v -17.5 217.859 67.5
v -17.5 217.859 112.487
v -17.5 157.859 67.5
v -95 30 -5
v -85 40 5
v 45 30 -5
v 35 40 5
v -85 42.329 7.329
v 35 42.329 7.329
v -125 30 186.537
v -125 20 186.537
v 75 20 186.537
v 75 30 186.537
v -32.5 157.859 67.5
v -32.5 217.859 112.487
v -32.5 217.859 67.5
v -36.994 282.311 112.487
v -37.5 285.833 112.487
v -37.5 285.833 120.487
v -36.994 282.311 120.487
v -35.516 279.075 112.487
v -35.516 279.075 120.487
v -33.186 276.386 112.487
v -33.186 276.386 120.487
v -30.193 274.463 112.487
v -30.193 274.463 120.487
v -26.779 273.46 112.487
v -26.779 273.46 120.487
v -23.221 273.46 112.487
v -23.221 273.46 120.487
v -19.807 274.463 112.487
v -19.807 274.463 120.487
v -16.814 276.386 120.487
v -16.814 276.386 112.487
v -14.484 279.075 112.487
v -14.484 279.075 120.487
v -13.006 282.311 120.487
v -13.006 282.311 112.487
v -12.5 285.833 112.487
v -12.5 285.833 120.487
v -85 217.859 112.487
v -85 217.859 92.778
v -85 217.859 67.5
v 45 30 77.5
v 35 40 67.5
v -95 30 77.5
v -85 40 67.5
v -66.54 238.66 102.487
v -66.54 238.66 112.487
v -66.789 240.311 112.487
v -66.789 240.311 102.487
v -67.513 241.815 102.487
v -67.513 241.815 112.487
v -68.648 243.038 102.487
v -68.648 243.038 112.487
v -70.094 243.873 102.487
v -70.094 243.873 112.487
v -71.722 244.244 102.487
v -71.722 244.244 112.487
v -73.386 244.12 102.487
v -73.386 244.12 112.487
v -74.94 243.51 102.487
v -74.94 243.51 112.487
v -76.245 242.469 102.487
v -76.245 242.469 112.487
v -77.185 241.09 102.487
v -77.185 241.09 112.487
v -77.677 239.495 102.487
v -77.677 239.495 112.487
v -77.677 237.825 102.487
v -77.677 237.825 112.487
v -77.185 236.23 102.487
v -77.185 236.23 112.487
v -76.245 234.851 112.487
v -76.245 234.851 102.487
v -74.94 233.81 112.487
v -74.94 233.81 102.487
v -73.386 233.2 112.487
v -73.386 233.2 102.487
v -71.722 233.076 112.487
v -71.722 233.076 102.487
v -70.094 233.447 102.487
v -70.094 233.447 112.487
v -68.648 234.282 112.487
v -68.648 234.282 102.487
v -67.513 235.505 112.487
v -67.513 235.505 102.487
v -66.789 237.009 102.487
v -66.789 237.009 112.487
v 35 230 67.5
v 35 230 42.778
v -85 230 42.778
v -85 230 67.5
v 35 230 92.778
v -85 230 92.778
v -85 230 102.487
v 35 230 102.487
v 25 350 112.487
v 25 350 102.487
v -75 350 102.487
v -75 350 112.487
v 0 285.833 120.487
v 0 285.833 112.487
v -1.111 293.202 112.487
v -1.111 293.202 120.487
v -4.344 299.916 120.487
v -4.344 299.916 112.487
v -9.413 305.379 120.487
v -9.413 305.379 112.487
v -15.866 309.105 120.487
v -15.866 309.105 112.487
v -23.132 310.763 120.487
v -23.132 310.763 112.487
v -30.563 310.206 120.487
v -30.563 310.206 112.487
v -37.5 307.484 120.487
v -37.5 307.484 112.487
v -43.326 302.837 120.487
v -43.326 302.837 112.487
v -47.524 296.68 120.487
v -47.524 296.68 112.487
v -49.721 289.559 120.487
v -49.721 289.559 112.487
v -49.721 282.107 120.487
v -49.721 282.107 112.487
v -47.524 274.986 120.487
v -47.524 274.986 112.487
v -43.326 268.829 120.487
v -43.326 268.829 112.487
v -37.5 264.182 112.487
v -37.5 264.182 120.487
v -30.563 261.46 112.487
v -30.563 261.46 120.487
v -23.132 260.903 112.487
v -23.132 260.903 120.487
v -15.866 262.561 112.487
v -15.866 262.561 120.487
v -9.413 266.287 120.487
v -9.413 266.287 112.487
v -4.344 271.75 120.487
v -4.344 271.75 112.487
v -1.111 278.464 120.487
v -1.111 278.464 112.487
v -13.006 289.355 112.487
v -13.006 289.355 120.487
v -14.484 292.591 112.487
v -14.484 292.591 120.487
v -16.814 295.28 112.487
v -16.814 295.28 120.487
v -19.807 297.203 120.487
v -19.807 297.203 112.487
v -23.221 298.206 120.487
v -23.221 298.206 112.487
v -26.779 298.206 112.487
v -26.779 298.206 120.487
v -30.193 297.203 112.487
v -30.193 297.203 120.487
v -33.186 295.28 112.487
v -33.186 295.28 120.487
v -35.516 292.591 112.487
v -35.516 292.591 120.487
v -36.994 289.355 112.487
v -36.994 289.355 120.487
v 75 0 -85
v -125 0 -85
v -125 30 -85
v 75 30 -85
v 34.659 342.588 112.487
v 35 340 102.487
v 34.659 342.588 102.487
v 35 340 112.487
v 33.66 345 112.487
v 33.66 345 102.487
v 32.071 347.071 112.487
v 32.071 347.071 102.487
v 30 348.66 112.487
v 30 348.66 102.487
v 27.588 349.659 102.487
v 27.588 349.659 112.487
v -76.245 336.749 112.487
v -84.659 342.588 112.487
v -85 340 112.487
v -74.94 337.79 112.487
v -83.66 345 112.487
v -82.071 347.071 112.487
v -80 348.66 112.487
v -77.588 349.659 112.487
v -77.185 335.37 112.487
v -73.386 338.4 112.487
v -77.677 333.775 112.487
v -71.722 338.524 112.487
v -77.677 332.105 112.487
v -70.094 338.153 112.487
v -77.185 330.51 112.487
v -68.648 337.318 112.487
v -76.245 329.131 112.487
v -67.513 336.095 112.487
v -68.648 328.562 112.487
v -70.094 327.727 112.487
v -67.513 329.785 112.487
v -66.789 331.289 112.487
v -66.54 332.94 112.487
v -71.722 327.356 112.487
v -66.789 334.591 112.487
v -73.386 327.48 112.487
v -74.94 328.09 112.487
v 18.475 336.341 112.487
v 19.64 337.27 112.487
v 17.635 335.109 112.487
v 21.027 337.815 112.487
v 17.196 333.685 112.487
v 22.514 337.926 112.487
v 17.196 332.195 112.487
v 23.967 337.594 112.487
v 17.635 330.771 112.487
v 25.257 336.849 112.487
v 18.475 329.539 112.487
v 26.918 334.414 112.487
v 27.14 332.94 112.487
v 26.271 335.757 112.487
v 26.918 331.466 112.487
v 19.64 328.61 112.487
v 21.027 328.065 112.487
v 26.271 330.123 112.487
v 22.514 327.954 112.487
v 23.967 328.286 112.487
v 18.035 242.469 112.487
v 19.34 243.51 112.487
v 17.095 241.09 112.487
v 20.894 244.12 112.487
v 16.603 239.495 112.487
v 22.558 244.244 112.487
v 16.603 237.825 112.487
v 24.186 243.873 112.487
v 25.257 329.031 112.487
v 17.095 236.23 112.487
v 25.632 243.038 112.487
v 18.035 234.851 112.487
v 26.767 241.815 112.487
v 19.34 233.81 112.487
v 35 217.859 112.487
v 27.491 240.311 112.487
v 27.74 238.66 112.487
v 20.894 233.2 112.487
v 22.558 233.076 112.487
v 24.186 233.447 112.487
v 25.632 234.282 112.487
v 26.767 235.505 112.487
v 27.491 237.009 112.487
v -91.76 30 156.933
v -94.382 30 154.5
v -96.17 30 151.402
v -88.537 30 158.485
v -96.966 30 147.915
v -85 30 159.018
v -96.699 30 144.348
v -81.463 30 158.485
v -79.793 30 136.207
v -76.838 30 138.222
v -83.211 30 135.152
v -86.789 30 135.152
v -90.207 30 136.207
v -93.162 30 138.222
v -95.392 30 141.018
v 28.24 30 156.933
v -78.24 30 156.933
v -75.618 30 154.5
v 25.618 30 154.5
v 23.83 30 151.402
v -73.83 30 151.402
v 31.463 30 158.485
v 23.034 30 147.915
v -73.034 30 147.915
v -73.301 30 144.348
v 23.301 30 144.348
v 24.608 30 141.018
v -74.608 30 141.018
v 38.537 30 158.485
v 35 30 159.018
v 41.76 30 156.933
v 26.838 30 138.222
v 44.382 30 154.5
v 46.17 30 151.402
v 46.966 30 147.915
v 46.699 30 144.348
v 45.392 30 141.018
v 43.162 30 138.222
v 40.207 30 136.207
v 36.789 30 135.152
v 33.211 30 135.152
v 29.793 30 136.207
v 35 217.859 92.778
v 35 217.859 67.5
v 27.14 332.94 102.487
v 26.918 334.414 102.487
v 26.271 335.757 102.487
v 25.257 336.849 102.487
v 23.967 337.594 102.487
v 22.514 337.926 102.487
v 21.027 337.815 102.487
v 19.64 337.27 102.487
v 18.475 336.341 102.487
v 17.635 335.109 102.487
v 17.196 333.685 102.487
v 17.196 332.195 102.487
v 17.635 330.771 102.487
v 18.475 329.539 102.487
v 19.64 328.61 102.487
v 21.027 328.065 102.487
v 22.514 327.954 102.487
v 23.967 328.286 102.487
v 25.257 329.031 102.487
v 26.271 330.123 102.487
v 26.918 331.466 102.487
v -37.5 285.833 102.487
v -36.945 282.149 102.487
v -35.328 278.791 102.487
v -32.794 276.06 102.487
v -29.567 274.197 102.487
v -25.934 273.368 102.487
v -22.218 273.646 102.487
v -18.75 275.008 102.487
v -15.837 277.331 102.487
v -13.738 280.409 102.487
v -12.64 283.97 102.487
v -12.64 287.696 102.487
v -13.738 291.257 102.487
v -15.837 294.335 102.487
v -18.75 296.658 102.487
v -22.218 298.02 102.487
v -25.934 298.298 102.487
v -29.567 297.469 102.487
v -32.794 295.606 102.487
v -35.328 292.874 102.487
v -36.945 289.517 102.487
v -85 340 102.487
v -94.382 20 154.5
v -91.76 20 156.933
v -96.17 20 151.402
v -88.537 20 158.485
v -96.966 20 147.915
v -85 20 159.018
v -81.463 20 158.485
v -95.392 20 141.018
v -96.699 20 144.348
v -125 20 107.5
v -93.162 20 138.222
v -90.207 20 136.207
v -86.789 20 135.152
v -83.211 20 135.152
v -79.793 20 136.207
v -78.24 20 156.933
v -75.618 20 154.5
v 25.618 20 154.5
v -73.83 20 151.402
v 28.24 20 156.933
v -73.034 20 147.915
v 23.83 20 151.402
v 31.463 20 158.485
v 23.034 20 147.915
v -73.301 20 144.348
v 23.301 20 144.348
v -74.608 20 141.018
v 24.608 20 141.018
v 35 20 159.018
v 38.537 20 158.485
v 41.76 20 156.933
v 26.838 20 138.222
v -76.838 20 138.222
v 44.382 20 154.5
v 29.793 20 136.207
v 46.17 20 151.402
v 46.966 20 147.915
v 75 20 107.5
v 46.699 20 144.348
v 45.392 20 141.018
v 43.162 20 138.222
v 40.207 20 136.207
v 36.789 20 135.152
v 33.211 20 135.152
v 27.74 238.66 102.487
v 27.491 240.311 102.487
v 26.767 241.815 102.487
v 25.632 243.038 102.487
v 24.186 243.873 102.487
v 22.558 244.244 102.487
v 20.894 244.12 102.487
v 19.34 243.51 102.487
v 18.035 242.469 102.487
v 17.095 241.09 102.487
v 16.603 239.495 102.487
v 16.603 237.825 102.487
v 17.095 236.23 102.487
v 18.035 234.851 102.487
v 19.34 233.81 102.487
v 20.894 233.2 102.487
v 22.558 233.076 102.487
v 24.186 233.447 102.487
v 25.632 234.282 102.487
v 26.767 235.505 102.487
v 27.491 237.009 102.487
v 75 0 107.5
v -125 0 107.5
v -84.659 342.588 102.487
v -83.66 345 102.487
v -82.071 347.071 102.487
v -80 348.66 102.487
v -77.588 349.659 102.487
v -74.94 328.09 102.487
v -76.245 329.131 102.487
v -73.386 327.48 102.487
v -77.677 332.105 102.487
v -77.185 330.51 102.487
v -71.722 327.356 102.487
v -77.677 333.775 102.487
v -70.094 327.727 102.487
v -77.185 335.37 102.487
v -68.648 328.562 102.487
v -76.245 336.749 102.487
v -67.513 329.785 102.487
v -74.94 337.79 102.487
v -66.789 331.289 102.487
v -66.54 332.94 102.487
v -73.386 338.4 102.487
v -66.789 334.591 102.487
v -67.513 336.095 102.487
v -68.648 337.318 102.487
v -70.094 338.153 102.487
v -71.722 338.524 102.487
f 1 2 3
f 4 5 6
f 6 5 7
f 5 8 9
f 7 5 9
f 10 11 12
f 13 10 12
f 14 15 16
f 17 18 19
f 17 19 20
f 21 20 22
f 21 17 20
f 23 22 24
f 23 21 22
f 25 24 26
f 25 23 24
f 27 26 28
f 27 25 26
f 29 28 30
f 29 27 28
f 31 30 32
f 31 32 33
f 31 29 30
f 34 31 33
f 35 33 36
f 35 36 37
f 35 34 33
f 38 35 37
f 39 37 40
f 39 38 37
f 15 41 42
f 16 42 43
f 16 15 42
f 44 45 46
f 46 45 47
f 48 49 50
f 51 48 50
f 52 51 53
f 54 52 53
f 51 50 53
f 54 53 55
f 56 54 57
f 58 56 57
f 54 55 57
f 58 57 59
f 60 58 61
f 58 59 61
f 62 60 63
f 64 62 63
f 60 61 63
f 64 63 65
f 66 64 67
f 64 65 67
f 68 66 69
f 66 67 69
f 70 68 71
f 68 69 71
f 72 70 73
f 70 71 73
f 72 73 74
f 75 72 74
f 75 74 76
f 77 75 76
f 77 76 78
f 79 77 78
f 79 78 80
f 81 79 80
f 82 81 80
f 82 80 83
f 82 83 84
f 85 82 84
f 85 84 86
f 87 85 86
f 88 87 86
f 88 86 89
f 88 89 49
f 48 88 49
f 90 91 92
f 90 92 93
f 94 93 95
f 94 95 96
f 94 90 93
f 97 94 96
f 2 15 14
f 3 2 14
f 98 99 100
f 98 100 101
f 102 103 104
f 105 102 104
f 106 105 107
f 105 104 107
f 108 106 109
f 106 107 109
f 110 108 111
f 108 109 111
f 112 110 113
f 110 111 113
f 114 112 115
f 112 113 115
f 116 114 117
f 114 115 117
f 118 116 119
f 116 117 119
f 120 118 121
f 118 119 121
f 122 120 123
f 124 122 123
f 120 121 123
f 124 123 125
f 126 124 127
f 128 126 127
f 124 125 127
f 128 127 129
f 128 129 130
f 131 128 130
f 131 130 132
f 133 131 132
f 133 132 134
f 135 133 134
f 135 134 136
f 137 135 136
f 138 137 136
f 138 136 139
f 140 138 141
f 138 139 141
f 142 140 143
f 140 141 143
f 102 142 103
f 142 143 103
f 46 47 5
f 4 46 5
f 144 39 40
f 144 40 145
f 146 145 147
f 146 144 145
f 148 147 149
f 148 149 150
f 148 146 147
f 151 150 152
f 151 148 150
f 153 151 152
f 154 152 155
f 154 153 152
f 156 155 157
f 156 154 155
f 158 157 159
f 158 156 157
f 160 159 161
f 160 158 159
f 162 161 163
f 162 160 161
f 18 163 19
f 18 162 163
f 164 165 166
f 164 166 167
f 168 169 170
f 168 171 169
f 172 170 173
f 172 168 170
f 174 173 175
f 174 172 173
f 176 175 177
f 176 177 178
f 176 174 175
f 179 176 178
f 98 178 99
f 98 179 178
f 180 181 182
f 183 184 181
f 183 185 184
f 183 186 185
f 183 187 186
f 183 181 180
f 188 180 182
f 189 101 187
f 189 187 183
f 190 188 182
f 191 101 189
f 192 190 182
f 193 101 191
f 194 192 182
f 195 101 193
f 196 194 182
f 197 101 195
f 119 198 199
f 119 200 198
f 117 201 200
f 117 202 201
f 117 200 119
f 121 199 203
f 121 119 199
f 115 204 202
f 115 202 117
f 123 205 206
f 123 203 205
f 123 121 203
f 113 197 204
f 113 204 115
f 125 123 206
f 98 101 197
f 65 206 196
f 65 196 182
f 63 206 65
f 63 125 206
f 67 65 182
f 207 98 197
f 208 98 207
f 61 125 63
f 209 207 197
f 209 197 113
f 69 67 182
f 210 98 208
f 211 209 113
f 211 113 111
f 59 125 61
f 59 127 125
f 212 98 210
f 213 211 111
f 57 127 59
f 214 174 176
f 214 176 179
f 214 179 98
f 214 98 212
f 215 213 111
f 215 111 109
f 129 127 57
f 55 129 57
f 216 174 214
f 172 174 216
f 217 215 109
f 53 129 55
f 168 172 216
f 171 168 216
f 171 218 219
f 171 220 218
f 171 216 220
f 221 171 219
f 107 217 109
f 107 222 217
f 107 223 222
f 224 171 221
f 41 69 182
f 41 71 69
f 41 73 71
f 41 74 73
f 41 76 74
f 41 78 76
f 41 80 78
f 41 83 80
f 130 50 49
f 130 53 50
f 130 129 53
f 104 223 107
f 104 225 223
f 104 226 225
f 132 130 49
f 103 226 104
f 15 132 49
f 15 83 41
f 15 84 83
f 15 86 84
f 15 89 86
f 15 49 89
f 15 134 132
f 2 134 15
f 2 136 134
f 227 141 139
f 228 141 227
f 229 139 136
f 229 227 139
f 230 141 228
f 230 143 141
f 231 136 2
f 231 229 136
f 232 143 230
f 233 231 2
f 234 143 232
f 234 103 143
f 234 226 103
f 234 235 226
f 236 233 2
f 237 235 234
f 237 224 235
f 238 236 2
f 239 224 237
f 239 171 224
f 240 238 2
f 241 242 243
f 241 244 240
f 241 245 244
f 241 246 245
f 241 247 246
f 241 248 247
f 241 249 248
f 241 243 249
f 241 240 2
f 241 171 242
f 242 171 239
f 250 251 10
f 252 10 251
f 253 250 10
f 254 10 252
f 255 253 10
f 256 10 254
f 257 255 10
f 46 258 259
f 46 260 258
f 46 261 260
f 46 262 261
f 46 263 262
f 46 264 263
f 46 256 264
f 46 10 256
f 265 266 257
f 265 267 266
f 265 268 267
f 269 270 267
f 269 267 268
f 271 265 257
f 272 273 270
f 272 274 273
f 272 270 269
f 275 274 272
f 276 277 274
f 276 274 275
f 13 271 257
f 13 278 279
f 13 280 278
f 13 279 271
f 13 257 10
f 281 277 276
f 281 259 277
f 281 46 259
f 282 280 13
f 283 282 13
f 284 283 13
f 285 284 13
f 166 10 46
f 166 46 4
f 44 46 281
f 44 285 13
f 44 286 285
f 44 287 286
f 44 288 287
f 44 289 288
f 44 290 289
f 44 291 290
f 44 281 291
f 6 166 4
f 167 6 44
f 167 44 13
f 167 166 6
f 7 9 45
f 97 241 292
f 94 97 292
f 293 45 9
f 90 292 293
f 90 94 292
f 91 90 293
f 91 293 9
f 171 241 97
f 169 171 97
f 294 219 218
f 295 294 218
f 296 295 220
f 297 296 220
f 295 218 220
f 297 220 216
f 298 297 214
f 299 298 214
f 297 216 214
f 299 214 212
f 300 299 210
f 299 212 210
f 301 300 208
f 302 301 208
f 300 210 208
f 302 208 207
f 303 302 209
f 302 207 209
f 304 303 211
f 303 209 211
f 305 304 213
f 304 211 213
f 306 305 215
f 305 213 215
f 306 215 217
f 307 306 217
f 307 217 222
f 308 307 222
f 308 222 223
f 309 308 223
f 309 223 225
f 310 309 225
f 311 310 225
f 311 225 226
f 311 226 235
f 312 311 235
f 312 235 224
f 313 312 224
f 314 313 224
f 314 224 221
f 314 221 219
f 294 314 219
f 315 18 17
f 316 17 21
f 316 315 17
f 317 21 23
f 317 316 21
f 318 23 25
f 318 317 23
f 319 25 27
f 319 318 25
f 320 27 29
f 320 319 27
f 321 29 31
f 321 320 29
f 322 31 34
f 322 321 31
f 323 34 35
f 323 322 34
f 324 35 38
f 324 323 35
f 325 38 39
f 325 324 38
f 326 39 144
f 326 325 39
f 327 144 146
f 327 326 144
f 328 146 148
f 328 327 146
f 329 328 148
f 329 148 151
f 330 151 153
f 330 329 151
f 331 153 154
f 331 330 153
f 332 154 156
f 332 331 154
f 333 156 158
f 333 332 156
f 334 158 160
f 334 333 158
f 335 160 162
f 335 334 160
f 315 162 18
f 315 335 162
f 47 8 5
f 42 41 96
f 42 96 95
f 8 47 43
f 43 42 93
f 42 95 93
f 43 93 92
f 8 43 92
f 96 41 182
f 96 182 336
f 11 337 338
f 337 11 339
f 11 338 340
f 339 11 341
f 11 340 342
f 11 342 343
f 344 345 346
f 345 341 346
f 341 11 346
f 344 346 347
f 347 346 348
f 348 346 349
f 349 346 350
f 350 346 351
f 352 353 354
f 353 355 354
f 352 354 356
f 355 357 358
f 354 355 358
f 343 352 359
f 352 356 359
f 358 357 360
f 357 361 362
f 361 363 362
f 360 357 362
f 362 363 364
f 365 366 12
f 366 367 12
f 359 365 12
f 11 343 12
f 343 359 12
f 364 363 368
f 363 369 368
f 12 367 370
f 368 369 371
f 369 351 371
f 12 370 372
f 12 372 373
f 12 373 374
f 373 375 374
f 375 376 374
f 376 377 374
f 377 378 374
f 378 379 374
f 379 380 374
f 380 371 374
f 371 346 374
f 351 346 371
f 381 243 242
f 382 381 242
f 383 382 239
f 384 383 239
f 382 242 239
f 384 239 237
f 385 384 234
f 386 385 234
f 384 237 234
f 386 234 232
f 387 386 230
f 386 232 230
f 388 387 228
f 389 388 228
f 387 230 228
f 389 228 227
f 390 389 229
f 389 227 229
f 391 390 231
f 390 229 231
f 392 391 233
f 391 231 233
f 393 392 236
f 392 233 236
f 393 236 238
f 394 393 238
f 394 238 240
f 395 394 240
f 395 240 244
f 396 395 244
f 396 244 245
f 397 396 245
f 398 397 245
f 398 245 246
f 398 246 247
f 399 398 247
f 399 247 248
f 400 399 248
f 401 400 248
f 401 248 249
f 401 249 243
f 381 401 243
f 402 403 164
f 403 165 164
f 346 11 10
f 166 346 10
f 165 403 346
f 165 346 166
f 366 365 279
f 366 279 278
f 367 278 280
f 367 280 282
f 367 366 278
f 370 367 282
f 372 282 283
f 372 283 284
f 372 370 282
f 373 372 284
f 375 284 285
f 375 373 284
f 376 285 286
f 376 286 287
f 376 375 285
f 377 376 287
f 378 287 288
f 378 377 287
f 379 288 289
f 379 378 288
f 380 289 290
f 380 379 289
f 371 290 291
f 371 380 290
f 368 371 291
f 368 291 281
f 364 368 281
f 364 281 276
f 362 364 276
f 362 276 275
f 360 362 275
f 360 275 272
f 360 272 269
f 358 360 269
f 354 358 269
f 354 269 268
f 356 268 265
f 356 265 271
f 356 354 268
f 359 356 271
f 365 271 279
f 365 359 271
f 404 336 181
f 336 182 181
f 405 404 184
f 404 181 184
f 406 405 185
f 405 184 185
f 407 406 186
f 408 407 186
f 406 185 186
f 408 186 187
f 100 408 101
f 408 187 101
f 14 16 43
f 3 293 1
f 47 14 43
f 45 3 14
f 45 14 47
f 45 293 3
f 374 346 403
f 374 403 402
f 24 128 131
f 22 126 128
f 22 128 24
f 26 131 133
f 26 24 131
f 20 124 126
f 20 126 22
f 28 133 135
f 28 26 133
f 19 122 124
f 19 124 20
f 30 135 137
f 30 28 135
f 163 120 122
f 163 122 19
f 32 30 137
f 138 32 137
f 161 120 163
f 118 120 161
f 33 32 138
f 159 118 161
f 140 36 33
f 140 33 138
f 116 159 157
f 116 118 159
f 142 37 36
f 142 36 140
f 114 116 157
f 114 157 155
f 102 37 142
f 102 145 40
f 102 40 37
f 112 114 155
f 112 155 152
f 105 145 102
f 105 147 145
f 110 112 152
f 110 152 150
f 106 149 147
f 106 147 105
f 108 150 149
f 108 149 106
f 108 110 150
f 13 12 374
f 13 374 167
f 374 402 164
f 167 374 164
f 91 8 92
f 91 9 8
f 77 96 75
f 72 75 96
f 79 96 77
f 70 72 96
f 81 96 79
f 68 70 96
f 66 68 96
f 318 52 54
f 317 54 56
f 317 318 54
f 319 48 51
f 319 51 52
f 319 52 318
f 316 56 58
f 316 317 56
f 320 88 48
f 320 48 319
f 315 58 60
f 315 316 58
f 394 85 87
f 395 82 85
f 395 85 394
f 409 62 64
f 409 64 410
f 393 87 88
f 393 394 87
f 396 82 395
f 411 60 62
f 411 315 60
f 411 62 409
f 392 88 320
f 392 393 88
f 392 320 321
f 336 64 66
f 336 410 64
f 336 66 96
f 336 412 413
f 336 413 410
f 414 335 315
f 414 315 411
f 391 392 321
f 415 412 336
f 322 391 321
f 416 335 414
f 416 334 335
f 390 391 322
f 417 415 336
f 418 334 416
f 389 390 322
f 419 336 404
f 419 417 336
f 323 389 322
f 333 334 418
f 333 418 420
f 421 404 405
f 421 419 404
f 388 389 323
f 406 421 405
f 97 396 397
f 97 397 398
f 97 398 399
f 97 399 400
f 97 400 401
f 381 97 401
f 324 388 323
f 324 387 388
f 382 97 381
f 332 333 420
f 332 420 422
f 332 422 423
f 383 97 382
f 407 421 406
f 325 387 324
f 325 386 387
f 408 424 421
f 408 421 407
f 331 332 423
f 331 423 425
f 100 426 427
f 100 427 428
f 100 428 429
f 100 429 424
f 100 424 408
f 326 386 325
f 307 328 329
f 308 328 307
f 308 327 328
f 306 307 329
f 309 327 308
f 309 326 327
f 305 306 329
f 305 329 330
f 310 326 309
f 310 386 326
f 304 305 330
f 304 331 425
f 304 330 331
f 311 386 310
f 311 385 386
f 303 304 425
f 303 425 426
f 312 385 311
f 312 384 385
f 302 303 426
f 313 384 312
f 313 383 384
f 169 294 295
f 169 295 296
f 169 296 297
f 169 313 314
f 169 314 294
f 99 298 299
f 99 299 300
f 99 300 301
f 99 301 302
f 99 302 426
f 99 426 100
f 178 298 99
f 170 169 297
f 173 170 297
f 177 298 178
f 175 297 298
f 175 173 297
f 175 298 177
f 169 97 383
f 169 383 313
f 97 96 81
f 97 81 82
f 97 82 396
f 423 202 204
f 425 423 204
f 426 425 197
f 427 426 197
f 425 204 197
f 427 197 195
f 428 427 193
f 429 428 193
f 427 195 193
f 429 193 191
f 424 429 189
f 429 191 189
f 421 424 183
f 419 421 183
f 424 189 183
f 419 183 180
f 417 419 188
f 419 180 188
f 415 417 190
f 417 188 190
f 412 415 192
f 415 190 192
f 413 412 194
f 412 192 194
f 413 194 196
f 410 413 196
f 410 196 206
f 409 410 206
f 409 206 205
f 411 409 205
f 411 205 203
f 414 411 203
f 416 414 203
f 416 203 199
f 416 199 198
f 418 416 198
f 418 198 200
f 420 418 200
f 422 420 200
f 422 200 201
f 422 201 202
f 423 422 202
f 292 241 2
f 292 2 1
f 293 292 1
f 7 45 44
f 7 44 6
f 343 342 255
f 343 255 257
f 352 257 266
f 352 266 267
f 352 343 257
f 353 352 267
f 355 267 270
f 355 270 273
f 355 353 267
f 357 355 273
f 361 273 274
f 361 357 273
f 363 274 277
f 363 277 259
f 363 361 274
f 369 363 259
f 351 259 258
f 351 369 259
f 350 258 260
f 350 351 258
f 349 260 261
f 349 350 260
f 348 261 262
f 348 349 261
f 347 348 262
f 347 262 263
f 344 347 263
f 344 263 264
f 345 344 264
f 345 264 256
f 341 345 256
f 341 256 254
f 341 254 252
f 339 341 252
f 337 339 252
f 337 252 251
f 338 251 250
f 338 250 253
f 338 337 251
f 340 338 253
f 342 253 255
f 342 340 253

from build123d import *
from OCP.BRepFilletAPI import BRepFilletAPI_MakeChamfer
from build123d.topology import SkipClean

# Parameters (mm, degrees)
SKETCH_1_W               = 150
SKETCH_1_H               = 150
EXTRUDE_1_DEPTH          = 20
SKETCH_2_W               = 200
SKETCH_2_H               = 170
EXTRUDE_2_DEPTH          = 20
SKETCH_3_W               = 200
SKETCH_3_H               = 22.5
EXTRUDE_3_DEPTH          = 20
SKETCH_4_W               = 200
SKETCH_4_H               = 101.536616744
SKETCH_4_R               = 12
EXTRUDE_4_DEPTH          = 10
SKETCH_5_W               = 200
SKETCH_5_H               = 170
EXTRUDE_5_DEPTH          = 10
SKETCH_6_W               = 12.361111111
SKETCH_6_H               = 120
EXTRUDE_6_DEPTH          = 60
CHAMFER_1_SIZE           = 10
CHAMFER_1_SIZE2          = 12.546778674
SKETCH_8_R               = 12.5
CUT_EXTRUDE_1_DEPTH      = 200
SKETCH_9_R               = 5.6
CUT_EXTRUDE_2_DEPTH      = 200
FILLET_1_R               = 10
SKETCH_10_R              = 40
SKETCH_10_R_2            = 8.532995409
EXTRUDE_7_DEPTH          = 5
SKETCH_11_R              = 12.5
CUT_EXTRUDE_3_DEPTH      = 200
SKETCH_12_W              = 50
SKETCH_12_H              = 12.140710291
EXTRUDE_8_DEPTH          = 120
EXTRUDE_9_DEPTH          = 120
SKETCH_14_R              = 5
SKETCH_14_R_2            = 5.6
CUT_EXTRUDE_4_DEPTH      = 200
CUT_EXTRUDE_5_DEPTH      = 428.663313117
CUT_EXTRUDE_5_DEPTH_BACK = 428.663313117
SKETCH_16_W              = 64.88929467
SKETCH_16_H              = 154.650571828
SKETCH_17_R              = 25
SKETCH_17_R_2            = 12.5
EXTRUDE_11_DEPTH         = 8
FILLET_2_R               = 10
RIB_1_REACH              = 411.018
SKETCH_18_WALL_W         = 895.028437604
SKETCH_18_WALL_H         = 15
CUT_EXTRUDE_6_DEPTH      = 425.676064177
CUT_EXTRUDE_6_DEPTH_BACK = 425.676064177
SKETCH_19_R              = 12.5


with BuildPart() as part:
    # 草图1 → 凸台-拉伸1 (new body)
    with BuildSketch(Plane(origin=(0, 0, 0), x_dir=(1, 0, 0), z_dir=(0, 1, 0))):
        Rectangle(SKETCH_1_W, SKETCH_1_H)
    extrude(amount=EXTRUDE_1_DEPTH)

    # 草图2 → 凸台-拉伸2 (add)
    with BuildSketch(Plane(origin=(0, 20, 0), x_dir=(1, 0, 0), z_dir=(0, 1, 0))):
        with Locations((-25, 0)):
            Rectangle(SKETCH_2_W, SKETCH_2_H)
    extrude(amount=-EXTRUDE_2_DEPTH)

    # 草图3 → 凸台-拉伸3 (add)
    with BuildSketch(Plane(origin=(0, 20, 0), x_dir=(1, 0, 0), z_dir=(0, 1, 0))):
        with Locations((-25, -96.25)):
            Rectangle(SKETCH_3_W, SKETCH_3_H)
    extrude(amount=-EXTRUDE_3_DEPTH)

    # 草图4 → 凸台-拉伸4 (add)
    with BuildSketch(Plane(origin=(0, 20, 0), x_dir=(1, 0, 0), z_dir=(0, 1, 0))):
        with Locations((-25, -135.768308372)):
            Rectangle(SKETCH_4_W, SKETCH_4_H)
        with Locations(Location((35, -147.018308372, 0), (0, 0, 270))):
            Circle(SKETCH_4_R, mode=Mode.SUBTRACT)
        with Locations(Location((-85, -147.018308372, 0), (0, 0, 270))):
            Circle(SKETCH_4_R, mode=Mode.SUBTRACT)
    extrude(amount=EXTRUDE_4_DEPTH)

    # 草图5 → 凸台-拉伸5 (add)
    with BuildSketch(Plane(origin=(0, 20, 0), x_dir=(1, 0, 0), z_dir=(0, 1, 0))):
        with Locations((-25, 0)):
            Rectangle(SKETCH_5_W, SKETCH_5_H)
    extrude(amount=EXTRUDE_5_DEPTH)

    # 草图6 → 凸台-拉伸6 (add, symmetric)
    with BuildSketch(Plane(origin=(-25, 0, 0), x_dir=(0, 0, -1), z_dir=(1, 0, 0))):
        Polygon((-67.5, 30), (-5, 30), (-42.777777778, 230), (-67.5, 230), align=None)
        with Locations((-61.319444445, 290)):
            Rectangle(SKETCH_6_W, SKETCH_6_H)
    extrude(amount=EXTRUDE_6_DEPTH, both=True)

    # 倒角1: one chamfer whose edges measure the first distance from different faces: ONE call of the kernel's chamfer builder (chamfer() names one face for all edges)
    chamfer_1_edges_1 = [part.edges().sort_by_distance(p)[0] for p in [
        (-85, 30, 36.25),
        (-25, 30, 67.5),
        (35, 30, 36.25),
    ]]
    chamfer_1_edges_2 = [part.edges().sort_by_distance(p)[0] for p in [
        (-25, 30, 5),
    ]]
    chamfer_1_side_2 = [part.faces().sort_by_distance(p)[0] for p in [
        (-121.627580479, 30, 50.768308372),
    ]]
    chamfer_1 = BRepFilletAPI_MakeChamfer(part.part.solid().wrapped)
    for e in chamfer_1_edges_1:
        chamfer_1.Add(CHAMFER_1_SIZE, e.wrapped)
    for e in chamfer_1_edges_2:
        chamfer_1.Add(CHAMFER_1_SIZE, CHAMFER_1_SIZE2, e.wrapped, chamfer_1_side_2[0].wrapped)  # the first distance lies on this face
    add(Compound.cast(chamfer_1.Shape()), mode=Mode.REPLACE)

    # 草图8 → 切除-拉伸1 (cut)
    with BuildSketch(Plane.XY.offset(67.5)):
        with Locations((-25, 285.8)):
            Circle(SKETCH_8_R)
    extrude(amount=-CUT_EXTRUDE_1_DEPTH, mode=Mode.SUBTRACT)

    # 草图9 → 切除-拉伸2 (cut)
    with BuildSketch(Plane.XY.offset(67.5)):
        with Locations((-72.14, 333.54)):
            Circle(SKETCH_9_R)
        with Locations((-72.14, 239.26)):
            Circle(SKETCH_9_R)
        with Locations((22.14, 239.26)):
            Circle(SKETCH_9_R)
        with Locations((22.14, 333.54)):
            Circle(SKETCH_9_R)
    extrude(amount=-CUT_EXTRUDE_2_DEPTH, mode=Mode.SUBTRACT)

    # 圆角1
    fillet_1_edges = [part.edges().sort_by_distance(p)[0] for p in [
        (35, 350, 61.319444444),
        (-85, 350, 61.319444444),
    ]]
    fillet(fillet_1_edges, radius=FILLET_1_R)

    # 草图10 → 凸台-拉伸7 (add)
    with BuildSketch(Plane.XY.offset(67.5)):
        with Locations((-25, 285.8)):
            Circle(SKETCH_10_R)
        with Locations((-25, 285.8)):
            Circle(SKETCH_10_R_2, mode=Mode.SUBTRACT)
    extrude(amount=EXTRUDE_7_DEPTH)

    # 草图11 → 切除-拉伸3 (cut)
    with BuildSketch(Plane.XY.offset(72.5)):
        with Locations((-25, 285.8)):
            Circle(SKETCH_11_R)
    extrude(amount=-CUT_EXTRUDE_3_DEPTH, mode=Mode.SUBTRACT)

    # 草图12 → 凸台-拉伸8 (add)
    with BuildSketch(Plane(origin=(35, 0, 0), x_dir=(0, 0, -1), z_dir=(1, 0, 0))):
        with Locations((-67.777777778, 223.929644855)):
            Rectangle(SKETCH_12_W, SKETCH_12_H)
    extrude(amount=-EXTRUDE_8_DEPTH)

    # 草图13 → 凸台-拉伸9 (add)
    with BuildSketch(Plane(origin=(35, 0, 0), x_dir=(0, 0, -1), z_dir=(1, 0, 0))):
        Polygon((-92.777777778, 230), (-102.486640647, 230), (-102.486640647, 350), (-112.486640647, 350), (-112.486640647, 230), (-112.486640647, 217.859289709), (-92.777777778, 217.859289709), align=None)
    extrude(amount=-EXTRUDE_9_DEPTH)

    # 草图14 → 切除-拉伸4 (cut)
    with BuildSketch(Plane.XY.offset(112.486640647)):
        with Locations((22.14, 332.94)):
            Circle(SKETCH_14_R)
        with Locations((22.14, 238.66)):
            Circle(SKETCH_14_R_2)
        with Locations((-72.14, 238.66)):
            Circle(SKETCH_14_R_2)
        with Locations((-72.14, 332.94)):
            Circle(SKETCH_14_R_2)
    extrude(amount=-CUT_EXTRUDE_4_DEPTH, mode=Mode.SUBTRACT)

    # 草图16 → 切除-拉伸5 (cut, two sides: drawn at the far end of the back side and taken through both)
    with BuildSketch(Plane.ZY.offset(85).offset(-CUT_EXTRUDE_5_DEPTH_BACK)):
        with Locations((49.451016332, 307.325285914)):
            Rectangle(SKETCH_16_W, SKETCH_16_H)
    extrude(amount=CUT_EXTRUDE_5_DEPTH + CUT_EXTRUDE_5_DEPTH_BACK, mode=Mode.SUBTRACT)

    # 草图17 → 凸台-拉伸11 (add)
    with BuildSketch(Plane.XY.offset(112.486640647)):
        with Locations((-24.999999135, 285.832995409)):
            Circle(SKETCH_17_R)
        with Locations((-24.999999135, 285.832995409)):
            Circle(SKETCH_17_R_2, mode=Mode.SUBTRACT)
    extrude(amount=EXTRUDE_11_DEPTH)

    # 圆角2
    fillet_2_edges = [part.edges().sort_by_distance(p)[0] for p in [
        (35, 350, 107.486640647),
        (-85, 350, 107.486640647),
    ]]
    fillet(fillet_2_edges, radius=FILLET_2_R)

    # 草图18 wall → 筋1 (add, up to next)
    with BuildSketch(Plane(origin=(-25, 187.859289709, 89.993320324), x_dir=(0, -0.800085500873, -0.599885981911), z_dir=(0, 0.599885981911, -0.800085500873)), mode=Mode.PRIVATE) as rib_1_sk1:
        Rectangle(SKETCH_18_WALL_W, SKETCH_18_WALL_H)
    rib_1_tool1 = extrude(rib_1_sk1.sketch, amount=RIB_1_REACH, mode=Mode.PRIVATE) - part.part
    add(rib_1_tool1.solids().sort_by_distance((-25, 187.859289709, 89.993320324))[0])

    # 草图19 → 切除-拉伸6 (cut, two sides: drawn at the far end of the back side and taken through both)
    with SkipClean():  # the faces are left unmerged after this step: merging them gives an invalid solid
        with BuildSketch(Plane.XY.offset(120.486640647).offset(-CUT_EXTRUDE_6_DEPTH_BACK)):
            with Locations(Location((-24.999999135, 285.832995409, 0), (0, 0, 180))):
                Circle(SKETCH_19_R)
        extrude(amount=CUT_EXTRUDE_6_DEPTH + CUT_EXTRUDE_6_DEPTH_BACK, mode=Mode.SUBTRACT)
    add(part.part.scale(1), mode=Mode.REPLACE)  # the faces are merged on a copy


solid = part.part
